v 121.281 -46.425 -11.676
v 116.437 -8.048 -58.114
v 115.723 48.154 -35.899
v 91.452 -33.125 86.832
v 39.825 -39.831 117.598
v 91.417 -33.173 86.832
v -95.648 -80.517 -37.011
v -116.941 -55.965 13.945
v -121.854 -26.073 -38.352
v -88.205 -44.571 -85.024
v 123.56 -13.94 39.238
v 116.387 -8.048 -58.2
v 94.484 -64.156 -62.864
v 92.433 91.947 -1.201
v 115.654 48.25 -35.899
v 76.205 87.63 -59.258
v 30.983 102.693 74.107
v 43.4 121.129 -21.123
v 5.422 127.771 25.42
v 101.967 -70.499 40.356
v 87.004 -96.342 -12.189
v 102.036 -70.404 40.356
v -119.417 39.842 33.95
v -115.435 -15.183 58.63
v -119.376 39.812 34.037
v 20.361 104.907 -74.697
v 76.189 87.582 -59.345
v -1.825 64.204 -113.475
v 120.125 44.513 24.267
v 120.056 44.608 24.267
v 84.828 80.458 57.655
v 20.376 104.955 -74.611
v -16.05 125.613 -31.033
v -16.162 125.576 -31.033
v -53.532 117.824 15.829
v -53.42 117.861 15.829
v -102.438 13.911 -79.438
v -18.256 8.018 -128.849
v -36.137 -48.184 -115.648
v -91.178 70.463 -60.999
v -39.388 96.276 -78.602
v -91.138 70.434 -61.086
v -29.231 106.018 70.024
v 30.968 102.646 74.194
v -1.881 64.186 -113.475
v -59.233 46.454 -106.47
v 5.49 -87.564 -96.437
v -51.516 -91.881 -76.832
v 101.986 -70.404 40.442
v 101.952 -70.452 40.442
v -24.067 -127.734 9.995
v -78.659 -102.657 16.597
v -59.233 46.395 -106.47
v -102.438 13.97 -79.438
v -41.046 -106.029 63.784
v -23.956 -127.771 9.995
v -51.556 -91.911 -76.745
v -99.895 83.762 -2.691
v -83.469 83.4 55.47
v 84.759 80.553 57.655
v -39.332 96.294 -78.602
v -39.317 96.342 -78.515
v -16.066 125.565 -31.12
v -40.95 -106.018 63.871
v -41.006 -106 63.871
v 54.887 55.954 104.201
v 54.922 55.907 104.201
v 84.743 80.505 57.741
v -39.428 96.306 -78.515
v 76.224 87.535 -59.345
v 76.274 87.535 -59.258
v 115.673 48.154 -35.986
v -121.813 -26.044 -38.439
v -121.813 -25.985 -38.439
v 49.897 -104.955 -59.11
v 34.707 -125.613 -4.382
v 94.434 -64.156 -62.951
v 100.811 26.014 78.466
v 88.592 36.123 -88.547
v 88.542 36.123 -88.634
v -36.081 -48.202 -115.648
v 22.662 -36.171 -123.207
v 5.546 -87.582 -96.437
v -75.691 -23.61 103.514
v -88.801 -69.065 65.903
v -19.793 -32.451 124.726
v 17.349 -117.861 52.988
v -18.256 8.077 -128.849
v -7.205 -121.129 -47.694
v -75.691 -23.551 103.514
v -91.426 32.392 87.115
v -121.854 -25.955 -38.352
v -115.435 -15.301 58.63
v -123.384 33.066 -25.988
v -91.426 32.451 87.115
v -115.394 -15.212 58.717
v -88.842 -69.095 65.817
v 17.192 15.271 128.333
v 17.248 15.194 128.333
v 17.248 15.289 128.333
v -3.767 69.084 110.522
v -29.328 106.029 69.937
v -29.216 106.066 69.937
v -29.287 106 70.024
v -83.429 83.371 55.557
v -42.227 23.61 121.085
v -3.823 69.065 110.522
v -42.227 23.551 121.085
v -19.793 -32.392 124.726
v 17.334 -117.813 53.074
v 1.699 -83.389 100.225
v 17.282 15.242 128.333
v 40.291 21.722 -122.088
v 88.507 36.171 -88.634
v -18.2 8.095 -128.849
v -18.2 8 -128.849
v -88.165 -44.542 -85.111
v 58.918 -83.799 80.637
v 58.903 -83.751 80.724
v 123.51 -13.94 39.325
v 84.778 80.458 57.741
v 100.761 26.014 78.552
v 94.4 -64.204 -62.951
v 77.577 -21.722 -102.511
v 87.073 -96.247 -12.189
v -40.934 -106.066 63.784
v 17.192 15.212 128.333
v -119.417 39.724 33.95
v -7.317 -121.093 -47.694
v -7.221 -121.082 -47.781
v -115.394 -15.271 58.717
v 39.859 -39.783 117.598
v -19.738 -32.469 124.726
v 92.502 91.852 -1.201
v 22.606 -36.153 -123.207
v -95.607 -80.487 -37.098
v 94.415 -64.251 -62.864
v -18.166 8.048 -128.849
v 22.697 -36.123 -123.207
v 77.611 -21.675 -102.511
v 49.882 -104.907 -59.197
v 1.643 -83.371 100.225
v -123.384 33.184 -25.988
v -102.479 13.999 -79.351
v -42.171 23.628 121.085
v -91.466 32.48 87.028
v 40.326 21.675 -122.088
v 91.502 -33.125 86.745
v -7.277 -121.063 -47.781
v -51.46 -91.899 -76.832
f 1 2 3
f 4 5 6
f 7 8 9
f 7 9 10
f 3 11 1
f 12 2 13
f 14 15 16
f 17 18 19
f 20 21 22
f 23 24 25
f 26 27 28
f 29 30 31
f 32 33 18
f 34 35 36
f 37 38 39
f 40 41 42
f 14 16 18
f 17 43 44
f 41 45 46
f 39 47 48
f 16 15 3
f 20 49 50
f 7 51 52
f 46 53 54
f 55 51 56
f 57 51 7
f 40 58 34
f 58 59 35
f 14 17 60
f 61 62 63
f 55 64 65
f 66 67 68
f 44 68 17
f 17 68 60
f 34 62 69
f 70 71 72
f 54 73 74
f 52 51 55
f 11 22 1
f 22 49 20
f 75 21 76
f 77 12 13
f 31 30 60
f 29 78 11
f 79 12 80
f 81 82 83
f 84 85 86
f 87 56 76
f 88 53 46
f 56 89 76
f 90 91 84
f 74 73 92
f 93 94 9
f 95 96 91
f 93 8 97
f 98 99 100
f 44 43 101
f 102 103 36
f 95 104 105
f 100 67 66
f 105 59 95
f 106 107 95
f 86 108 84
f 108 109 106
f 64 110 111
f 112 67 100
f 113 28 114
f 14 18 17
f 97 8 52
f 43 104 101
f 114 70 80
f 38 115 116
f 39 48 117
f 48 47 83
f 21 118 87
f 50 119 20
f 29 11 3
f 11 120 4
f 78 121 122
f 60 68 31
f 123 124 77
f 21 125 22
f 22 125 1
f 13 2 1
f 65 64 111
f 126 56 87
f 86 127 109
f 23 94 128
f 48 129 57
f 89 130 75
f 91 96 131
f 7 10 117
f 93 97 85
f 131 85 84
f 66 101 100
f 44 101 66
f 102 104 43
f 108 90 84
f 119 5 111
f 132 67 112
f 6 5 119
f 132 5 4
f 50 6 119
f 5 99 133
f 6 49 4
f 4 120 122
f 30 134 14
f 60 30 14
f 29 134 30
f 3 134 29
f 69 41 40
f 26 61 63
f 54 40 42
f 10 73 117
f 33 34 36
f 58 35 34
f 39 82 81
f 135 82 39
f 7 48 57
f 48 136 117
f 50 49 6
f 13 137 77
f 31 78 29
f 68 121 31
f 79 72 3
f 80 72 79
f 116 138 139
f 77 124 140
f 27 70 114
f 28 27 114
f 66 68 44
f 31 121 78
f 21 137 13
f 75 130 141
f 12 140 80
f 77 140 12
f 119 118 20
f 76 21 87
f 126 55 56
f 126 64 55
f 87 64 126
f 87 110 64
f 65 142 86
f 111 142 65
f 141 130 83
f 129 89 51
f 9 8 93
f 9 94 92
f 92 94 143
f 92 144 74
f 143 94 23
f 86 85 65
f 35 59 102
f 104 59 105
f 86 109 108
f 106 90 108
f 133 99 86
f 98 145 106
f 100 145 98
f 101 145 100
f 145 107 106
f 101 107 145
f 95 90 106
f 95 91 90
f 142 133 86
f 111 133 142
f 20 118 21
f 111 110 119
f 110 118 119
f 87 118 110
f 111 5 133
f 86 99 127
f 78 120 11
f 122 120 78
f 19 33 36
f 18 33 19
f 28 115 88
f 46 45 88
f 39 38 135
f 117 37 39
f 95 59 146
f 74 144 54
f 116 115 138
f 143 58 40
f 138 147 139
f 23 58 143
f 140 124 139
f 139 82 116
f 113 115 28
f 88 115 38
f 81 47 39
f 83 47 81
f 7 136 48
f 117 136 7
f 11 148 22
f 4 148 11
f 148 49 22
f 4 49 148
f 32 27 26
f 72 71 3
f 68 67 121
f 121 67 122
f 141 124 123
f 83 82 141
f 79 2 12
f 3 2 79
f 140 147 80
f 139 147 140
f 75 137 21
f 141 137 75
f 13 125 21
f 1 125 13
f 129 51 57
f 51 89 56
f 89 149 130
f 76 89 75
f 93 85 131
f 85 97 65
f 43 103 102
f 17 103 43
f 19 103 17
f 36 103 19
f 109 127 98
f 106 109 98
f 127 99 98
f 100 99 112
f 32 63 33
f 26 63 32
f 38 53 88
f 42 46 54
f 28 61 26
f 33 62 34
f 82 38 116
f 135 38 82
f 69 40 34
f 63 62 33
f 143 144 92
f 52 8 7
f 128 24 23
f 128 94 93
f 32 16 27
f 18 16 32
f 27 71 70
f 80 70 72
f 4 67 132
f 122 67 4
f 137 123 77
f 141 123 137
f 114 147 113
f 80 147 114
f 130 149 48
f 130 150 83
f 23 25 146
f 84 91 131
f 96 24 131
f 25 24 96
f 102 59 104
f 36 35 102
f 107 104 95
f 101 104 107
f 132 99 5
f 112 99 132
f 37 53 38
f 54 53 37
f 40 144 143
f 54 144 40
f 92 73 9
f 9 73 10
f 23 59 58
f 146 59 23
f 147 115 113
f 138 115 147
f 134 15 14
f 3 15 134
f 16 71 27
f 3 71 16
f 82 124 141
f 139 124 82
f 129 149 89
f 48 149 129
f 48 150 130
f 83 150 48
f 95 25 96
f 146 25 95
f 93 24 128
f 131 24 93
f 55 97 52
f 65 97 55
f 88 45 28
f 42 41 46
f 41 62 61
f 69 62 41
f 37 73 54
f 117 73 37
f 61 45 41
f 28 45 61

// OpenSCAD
// Auto-generated OpenSCAD file

    inner_points = 10*[[-3.934754268643416, 9.624674234376046, -7.851524807855261], [2.0345397231051754, 10.485986120925153, -7.461087740250035], [1.7318344641569683, -11.776543235349655, 5.2987607886693375], [0.1683800813816141, -8.334117119951914, 10.01385175943596], [-9.109712575503128, 7.040422612938008, -6.0998912534394645], [7.617382062285063, 8.75345295740217, -5.925844996332884], [3.4676268697388344, -12.551757753846433, -0.43821029410883217], [-1.9752963565204287, -3.2421178164941162, 12.46394654388118], [-1.6081195311151826, 12.551757753845969, -3.1032911470324], [-0.18407021034274096, 6.415636884482358, -11.338818660026778], [5.888725923216813, -8.370350794876773, 8.063697765466006], [-4.096536181758548, -10.597043843451926, 6.378412041593173], [-9.981377961977802, 8.370350794877195, -0.2690885201528479], [8.849158448282287, 3.6123393392657865, -8.854743719387177], [8.697297032862213, -9.624674234376938, -1.21891643894436], [-7.5650775191663575, -2.3580158997664142, 10.342748678484384], [-5.345138490776256, 11.776543235350008, 1.58291219629827], [4.027595782188195, 2.167489546755543, -12.200145423758045], [10.193618538041807, -7.040422612938355, 4.035551711099553], [-8.876075829453404, -6.9036101691675675, 6.581681516360222], [-8.81241585524271, -4.451257583175622, -8.50239494515084], [8.472776712575616, 8.045781926536758, 5.765460523695355], [-5.147535551660942, -9.185183755465285, -7.674526969368401], [5.487174694328377, 5.5906594121037765, 10.411461390823884], [-10.239796960851773, 1.3940450920819896, -7.935129713029881], [9.240187590422273, 9.185183755464491, -0.12008227594475507], [-0.7236289830661773, -12.103402911253072, -4.769390542152962], [1.7232383534960178, 1.524174063706221, 12.8246025311276], [-3.609663073290616, -4.815444893607725, -11.556163293013322], [3.0952361259935204, 10.25981202520349, 7.410725849245267], [-9.556682675113954, -8.045781926536785, -3.701120981355446], [10.07110962241139, 2.601414794940651, 7.846558425123502], [-5.919214217065484, 4.642453509489781, -10.638308866805513], [4.336933009685803, 12.103402911252351, -2.112282442814645], [-2.3986514840737034, -12.767559707222448, 0.9994884998345693], [3.980932691453726, -3.9782967135200544, 11.75110280978559], [-1.821566124590216, 0.8047776455314388, -12.876230693639993], [0.539144145450394, 12.767559707222542, 2.542012941306662], [-7.857778890211978, -10.259812025202965, 1.6597153975543564], [9.14020086935214, -3.312525327551386, 8.674502354778973], [-11.933574654219347, 3.9782967135210505, 3.395001960558674], [11.633715425979657, -0.8047776455330826, -5.811375517845503], [9.438411179837178, -6.41563688448392, -6.286420670589553], [-9.13855195159715, 3.242117816495581, 8.702794227876382], [-12.330300067899131, 3.312525327551675, -2.598838831234332], [11.562305036056578, 4.815444893606355, -3.5899414773309406], [4.9866565462515835, -10.485986120926382, -5.911043786194371], [-4.218661514408689, 2.358015899767981, 12.099824094759644], [-11.53538765488512, -1.5241740637049466, 5.863003680357895], [12.11805949183547, -4.642453509490887, -1.1676243597123763], [7.756143251387194, -2.1674895467574804, -10.242427349485983], [-8.338815088337205, 8.334117119952944, 5.547048028840463], [-12.177302858419873, -2.601414794940523, -3.8352344439187696], [12.002515053790042, 4.45125758317496, 2.4267314216061995], [0.5530529446708676, -8.753452957403566, -9.635054791943539], [-0.3782651400406938, 6.903610169168757, 11.043557814256108], [-11.686019969098021, -5.590659412103041, 1.3944718356940022], [12.345990196860598, -1.3940450920824885, 3.923805731825148], [2.264689859835633, -3.6123393392676255, -12.311997052370383], [-2.924660087597868, 10.597043843452784, 6.993719484851233]];

    outer_points = 10*[[10.071109622413474, 2.6014147949405393, 7.846558425120786], [12.345990196861674, -1.3940450920822869, 3.923805731821532], [-10.239796960854168, 1.3940450920822869, -7.935129713026865], [-12.17730285842098, -2.6014147949405393, -3.8352344439154527], [5.487174694331107, 5.590659412103372, 10.411461390822668], [12.118059491835183, -4.642453509490371, -1.1676243597161307], [-5.9192142170687445, 4.642453509490371, -10.638308866803527], [-11.686019969097547, -5.590659412103372, 1.39447183569699], [9.14020086935463, -3.3125253275515747, 8.674502354776148], [12.002515053790523, 4.451257583175247, 2.4267314216030487], [-8.812415855245098, -4.451257583175247, -8.502394945148598], [-12.330300067900055, 3.3125253275515747, -2.598838831230599], [1.7232383534995543, 1.5241740637055565, 12.824602531127201], [11.633715425977934, -0.8047776455322888, -5.811375517848879], [-1.8215661245940034, 0.8047776455322888, -12.876230693639418], [-11.535387654883486, -1.5241740637055565, 5.863003680361096], [3.980932691457114, -3.978296713520585, 11.7511028097842], [11.562305036055328, 4.815444893607008, -3.5899414773339413], [-3.6096630732938655, -4.815444893607008, -11.556163293012593], [-11.933574654218575, 3.978296713520585, 3.395001960562335], [0.5391441454506666, 12.767559707222489, 2.5420129413073114], [3.4676268697389867, -12.55175775384621, -0.4382102941106134], [-1.6081195311165173, 12.55175775384621, -3.103291147031149], [-2.398651484073136, -12.767559707222489, 0.999488499834451], [3.095236125995256, 10.259812025203203, 7.410725849245026], [8.69729703286206, -9.62467423437652, -1.2189164389474514], [-3.9347542686460235, 9.62467423437652, -7.851524807853531], [-7.857778890211292, -10.259812025203203, 1.659715397555956], [4.336933009684766, 12.103402911252703, -2.112282442815122], [1.731834464158737, -11.776543235349846, 5.298760788668099], [-5.345138490776227, 11.776543235349846, 1.582912196300538], [-0.7236289830672755, -12.103402911252703, -4.769390542153515], [8.472776712576946, 8.045781926536733, 5.765460523693438], [10.19361853804308, -7.0404226129382215, 4.035551711096198], [-9.10971257550516, 7.0404226129382215, -6.099891253436415], [-9.556682675114866, -8.045781926536733, -3.7011209813532204], [9.24018759042189, 9.18518375546486, -0.12008227594681875], [5.888725923219275, -8.370350794877018, 8.063697765463793], [-9.981377961978207, 8.370350794877018, -0.2690885201494684], [-5.147535551662957, -9.18518375546486, -7.674526969367506], [-4.218661514405383, 2.35801589976719, 12.099824094760997], [7.756143251384243, -2.1674895467565194, -10.242427349488334], [4.027595782184559, 2.1674895467565194, -12.20014542375906], [-7.5650775191634185, -2.35801589976719, 10.342748678486398], [-0.3782651400378221, 6.903610169168144, 11.043557814256651], [9.43841117983548, -6.415636884483159, -6.286420670592655], [-0.18407021034625082, 6.415636884483159, -11.33881866002632], [-8.876075829451407, -6.903610169168144, 6.581681516362324], [-9.13855195159484, 3.2421178164948627, 8.702794227879199], [2.2646898598321332, -3.612339339266692, -12.31199705237126], [8.849158448279566, 3.612339339266692, -8.85474371938948], [-1.9752963565168589, -3.2421178164948627, 12.46394654388154], [-2.9246600875962603, 10.597043843452353, 6.993719484852735], [4.98665654625011, -10.485986120925775, -5.911043786196456], [2.0345397231026543, 10.485986120925775, -7.461087740249956], [-4.0965361817565045, -10.597043843452353, 6.378412041593676], [-8.338815088335943, 8.334117119952449, 5.54704802884337], [0.5530529446682806, -8.753452957402853, -9.635054791944246], [7.617382062283031, 8.753452957402853, -5.925844996334511], [0.16838008138463145, -8.334117119952449, 10.013851759435386]];

    // Convex hull for inner set (I)
    module inner_hull() {
        hull() {
            for (p = inner_points) {
                translate(p) sphere(r=0.1);
            }
        }
    }

    // Convex hull for outer set (O) minus inner hull (O \ I)
    module outer_minus_inner() {
        difference() {
            hull() {
                for (p = outer_points) {
                    translate(p) sphere(r=0.1);
                }
            }
            inner_hull(); // Subtract inner hull
        }
    }

    // Convex hull for outer set (O) minus all translated inner hulls
    module outer_minus_AllTranslationInner() {
        difference() {
            hull() {
                for (p = outer_points) {
                    translate(p) sphere(r=0.1);
                }
            }
            hull() {
                translate([0,0,5]) inner_hull();
                translate([0,0,-5]) inner_hull();
            }; // Subtract translated inner hulls
        }
    }

    // Difference between outer_minus_inner and outer_minus_AllTranslationInner
    module outer_minus_inner_diff() {
        difference() {
            // Outer minus inner
            difference() {
                hull() {
                    for (p = outer_points) {
                        translate(p) sphere(r=0.1);
                    }
                }
                inner_hull();
            }

            // Subtract Outer minus AllTranslationInner
            difference() {
                hull() {
                    for (p = outer_points) {
                        translate(p) sphere(r=0.1);
                    }
                }
                hull() {
                    translate([0,0,5]) inner_hull();
                    translate([0,0,-5]) inner_hull();
                };
            }
        }
    }

    // Rendering all with colors applied
    color([1, 0, 0, 0.5]) inner_hull(); // Transparent red
